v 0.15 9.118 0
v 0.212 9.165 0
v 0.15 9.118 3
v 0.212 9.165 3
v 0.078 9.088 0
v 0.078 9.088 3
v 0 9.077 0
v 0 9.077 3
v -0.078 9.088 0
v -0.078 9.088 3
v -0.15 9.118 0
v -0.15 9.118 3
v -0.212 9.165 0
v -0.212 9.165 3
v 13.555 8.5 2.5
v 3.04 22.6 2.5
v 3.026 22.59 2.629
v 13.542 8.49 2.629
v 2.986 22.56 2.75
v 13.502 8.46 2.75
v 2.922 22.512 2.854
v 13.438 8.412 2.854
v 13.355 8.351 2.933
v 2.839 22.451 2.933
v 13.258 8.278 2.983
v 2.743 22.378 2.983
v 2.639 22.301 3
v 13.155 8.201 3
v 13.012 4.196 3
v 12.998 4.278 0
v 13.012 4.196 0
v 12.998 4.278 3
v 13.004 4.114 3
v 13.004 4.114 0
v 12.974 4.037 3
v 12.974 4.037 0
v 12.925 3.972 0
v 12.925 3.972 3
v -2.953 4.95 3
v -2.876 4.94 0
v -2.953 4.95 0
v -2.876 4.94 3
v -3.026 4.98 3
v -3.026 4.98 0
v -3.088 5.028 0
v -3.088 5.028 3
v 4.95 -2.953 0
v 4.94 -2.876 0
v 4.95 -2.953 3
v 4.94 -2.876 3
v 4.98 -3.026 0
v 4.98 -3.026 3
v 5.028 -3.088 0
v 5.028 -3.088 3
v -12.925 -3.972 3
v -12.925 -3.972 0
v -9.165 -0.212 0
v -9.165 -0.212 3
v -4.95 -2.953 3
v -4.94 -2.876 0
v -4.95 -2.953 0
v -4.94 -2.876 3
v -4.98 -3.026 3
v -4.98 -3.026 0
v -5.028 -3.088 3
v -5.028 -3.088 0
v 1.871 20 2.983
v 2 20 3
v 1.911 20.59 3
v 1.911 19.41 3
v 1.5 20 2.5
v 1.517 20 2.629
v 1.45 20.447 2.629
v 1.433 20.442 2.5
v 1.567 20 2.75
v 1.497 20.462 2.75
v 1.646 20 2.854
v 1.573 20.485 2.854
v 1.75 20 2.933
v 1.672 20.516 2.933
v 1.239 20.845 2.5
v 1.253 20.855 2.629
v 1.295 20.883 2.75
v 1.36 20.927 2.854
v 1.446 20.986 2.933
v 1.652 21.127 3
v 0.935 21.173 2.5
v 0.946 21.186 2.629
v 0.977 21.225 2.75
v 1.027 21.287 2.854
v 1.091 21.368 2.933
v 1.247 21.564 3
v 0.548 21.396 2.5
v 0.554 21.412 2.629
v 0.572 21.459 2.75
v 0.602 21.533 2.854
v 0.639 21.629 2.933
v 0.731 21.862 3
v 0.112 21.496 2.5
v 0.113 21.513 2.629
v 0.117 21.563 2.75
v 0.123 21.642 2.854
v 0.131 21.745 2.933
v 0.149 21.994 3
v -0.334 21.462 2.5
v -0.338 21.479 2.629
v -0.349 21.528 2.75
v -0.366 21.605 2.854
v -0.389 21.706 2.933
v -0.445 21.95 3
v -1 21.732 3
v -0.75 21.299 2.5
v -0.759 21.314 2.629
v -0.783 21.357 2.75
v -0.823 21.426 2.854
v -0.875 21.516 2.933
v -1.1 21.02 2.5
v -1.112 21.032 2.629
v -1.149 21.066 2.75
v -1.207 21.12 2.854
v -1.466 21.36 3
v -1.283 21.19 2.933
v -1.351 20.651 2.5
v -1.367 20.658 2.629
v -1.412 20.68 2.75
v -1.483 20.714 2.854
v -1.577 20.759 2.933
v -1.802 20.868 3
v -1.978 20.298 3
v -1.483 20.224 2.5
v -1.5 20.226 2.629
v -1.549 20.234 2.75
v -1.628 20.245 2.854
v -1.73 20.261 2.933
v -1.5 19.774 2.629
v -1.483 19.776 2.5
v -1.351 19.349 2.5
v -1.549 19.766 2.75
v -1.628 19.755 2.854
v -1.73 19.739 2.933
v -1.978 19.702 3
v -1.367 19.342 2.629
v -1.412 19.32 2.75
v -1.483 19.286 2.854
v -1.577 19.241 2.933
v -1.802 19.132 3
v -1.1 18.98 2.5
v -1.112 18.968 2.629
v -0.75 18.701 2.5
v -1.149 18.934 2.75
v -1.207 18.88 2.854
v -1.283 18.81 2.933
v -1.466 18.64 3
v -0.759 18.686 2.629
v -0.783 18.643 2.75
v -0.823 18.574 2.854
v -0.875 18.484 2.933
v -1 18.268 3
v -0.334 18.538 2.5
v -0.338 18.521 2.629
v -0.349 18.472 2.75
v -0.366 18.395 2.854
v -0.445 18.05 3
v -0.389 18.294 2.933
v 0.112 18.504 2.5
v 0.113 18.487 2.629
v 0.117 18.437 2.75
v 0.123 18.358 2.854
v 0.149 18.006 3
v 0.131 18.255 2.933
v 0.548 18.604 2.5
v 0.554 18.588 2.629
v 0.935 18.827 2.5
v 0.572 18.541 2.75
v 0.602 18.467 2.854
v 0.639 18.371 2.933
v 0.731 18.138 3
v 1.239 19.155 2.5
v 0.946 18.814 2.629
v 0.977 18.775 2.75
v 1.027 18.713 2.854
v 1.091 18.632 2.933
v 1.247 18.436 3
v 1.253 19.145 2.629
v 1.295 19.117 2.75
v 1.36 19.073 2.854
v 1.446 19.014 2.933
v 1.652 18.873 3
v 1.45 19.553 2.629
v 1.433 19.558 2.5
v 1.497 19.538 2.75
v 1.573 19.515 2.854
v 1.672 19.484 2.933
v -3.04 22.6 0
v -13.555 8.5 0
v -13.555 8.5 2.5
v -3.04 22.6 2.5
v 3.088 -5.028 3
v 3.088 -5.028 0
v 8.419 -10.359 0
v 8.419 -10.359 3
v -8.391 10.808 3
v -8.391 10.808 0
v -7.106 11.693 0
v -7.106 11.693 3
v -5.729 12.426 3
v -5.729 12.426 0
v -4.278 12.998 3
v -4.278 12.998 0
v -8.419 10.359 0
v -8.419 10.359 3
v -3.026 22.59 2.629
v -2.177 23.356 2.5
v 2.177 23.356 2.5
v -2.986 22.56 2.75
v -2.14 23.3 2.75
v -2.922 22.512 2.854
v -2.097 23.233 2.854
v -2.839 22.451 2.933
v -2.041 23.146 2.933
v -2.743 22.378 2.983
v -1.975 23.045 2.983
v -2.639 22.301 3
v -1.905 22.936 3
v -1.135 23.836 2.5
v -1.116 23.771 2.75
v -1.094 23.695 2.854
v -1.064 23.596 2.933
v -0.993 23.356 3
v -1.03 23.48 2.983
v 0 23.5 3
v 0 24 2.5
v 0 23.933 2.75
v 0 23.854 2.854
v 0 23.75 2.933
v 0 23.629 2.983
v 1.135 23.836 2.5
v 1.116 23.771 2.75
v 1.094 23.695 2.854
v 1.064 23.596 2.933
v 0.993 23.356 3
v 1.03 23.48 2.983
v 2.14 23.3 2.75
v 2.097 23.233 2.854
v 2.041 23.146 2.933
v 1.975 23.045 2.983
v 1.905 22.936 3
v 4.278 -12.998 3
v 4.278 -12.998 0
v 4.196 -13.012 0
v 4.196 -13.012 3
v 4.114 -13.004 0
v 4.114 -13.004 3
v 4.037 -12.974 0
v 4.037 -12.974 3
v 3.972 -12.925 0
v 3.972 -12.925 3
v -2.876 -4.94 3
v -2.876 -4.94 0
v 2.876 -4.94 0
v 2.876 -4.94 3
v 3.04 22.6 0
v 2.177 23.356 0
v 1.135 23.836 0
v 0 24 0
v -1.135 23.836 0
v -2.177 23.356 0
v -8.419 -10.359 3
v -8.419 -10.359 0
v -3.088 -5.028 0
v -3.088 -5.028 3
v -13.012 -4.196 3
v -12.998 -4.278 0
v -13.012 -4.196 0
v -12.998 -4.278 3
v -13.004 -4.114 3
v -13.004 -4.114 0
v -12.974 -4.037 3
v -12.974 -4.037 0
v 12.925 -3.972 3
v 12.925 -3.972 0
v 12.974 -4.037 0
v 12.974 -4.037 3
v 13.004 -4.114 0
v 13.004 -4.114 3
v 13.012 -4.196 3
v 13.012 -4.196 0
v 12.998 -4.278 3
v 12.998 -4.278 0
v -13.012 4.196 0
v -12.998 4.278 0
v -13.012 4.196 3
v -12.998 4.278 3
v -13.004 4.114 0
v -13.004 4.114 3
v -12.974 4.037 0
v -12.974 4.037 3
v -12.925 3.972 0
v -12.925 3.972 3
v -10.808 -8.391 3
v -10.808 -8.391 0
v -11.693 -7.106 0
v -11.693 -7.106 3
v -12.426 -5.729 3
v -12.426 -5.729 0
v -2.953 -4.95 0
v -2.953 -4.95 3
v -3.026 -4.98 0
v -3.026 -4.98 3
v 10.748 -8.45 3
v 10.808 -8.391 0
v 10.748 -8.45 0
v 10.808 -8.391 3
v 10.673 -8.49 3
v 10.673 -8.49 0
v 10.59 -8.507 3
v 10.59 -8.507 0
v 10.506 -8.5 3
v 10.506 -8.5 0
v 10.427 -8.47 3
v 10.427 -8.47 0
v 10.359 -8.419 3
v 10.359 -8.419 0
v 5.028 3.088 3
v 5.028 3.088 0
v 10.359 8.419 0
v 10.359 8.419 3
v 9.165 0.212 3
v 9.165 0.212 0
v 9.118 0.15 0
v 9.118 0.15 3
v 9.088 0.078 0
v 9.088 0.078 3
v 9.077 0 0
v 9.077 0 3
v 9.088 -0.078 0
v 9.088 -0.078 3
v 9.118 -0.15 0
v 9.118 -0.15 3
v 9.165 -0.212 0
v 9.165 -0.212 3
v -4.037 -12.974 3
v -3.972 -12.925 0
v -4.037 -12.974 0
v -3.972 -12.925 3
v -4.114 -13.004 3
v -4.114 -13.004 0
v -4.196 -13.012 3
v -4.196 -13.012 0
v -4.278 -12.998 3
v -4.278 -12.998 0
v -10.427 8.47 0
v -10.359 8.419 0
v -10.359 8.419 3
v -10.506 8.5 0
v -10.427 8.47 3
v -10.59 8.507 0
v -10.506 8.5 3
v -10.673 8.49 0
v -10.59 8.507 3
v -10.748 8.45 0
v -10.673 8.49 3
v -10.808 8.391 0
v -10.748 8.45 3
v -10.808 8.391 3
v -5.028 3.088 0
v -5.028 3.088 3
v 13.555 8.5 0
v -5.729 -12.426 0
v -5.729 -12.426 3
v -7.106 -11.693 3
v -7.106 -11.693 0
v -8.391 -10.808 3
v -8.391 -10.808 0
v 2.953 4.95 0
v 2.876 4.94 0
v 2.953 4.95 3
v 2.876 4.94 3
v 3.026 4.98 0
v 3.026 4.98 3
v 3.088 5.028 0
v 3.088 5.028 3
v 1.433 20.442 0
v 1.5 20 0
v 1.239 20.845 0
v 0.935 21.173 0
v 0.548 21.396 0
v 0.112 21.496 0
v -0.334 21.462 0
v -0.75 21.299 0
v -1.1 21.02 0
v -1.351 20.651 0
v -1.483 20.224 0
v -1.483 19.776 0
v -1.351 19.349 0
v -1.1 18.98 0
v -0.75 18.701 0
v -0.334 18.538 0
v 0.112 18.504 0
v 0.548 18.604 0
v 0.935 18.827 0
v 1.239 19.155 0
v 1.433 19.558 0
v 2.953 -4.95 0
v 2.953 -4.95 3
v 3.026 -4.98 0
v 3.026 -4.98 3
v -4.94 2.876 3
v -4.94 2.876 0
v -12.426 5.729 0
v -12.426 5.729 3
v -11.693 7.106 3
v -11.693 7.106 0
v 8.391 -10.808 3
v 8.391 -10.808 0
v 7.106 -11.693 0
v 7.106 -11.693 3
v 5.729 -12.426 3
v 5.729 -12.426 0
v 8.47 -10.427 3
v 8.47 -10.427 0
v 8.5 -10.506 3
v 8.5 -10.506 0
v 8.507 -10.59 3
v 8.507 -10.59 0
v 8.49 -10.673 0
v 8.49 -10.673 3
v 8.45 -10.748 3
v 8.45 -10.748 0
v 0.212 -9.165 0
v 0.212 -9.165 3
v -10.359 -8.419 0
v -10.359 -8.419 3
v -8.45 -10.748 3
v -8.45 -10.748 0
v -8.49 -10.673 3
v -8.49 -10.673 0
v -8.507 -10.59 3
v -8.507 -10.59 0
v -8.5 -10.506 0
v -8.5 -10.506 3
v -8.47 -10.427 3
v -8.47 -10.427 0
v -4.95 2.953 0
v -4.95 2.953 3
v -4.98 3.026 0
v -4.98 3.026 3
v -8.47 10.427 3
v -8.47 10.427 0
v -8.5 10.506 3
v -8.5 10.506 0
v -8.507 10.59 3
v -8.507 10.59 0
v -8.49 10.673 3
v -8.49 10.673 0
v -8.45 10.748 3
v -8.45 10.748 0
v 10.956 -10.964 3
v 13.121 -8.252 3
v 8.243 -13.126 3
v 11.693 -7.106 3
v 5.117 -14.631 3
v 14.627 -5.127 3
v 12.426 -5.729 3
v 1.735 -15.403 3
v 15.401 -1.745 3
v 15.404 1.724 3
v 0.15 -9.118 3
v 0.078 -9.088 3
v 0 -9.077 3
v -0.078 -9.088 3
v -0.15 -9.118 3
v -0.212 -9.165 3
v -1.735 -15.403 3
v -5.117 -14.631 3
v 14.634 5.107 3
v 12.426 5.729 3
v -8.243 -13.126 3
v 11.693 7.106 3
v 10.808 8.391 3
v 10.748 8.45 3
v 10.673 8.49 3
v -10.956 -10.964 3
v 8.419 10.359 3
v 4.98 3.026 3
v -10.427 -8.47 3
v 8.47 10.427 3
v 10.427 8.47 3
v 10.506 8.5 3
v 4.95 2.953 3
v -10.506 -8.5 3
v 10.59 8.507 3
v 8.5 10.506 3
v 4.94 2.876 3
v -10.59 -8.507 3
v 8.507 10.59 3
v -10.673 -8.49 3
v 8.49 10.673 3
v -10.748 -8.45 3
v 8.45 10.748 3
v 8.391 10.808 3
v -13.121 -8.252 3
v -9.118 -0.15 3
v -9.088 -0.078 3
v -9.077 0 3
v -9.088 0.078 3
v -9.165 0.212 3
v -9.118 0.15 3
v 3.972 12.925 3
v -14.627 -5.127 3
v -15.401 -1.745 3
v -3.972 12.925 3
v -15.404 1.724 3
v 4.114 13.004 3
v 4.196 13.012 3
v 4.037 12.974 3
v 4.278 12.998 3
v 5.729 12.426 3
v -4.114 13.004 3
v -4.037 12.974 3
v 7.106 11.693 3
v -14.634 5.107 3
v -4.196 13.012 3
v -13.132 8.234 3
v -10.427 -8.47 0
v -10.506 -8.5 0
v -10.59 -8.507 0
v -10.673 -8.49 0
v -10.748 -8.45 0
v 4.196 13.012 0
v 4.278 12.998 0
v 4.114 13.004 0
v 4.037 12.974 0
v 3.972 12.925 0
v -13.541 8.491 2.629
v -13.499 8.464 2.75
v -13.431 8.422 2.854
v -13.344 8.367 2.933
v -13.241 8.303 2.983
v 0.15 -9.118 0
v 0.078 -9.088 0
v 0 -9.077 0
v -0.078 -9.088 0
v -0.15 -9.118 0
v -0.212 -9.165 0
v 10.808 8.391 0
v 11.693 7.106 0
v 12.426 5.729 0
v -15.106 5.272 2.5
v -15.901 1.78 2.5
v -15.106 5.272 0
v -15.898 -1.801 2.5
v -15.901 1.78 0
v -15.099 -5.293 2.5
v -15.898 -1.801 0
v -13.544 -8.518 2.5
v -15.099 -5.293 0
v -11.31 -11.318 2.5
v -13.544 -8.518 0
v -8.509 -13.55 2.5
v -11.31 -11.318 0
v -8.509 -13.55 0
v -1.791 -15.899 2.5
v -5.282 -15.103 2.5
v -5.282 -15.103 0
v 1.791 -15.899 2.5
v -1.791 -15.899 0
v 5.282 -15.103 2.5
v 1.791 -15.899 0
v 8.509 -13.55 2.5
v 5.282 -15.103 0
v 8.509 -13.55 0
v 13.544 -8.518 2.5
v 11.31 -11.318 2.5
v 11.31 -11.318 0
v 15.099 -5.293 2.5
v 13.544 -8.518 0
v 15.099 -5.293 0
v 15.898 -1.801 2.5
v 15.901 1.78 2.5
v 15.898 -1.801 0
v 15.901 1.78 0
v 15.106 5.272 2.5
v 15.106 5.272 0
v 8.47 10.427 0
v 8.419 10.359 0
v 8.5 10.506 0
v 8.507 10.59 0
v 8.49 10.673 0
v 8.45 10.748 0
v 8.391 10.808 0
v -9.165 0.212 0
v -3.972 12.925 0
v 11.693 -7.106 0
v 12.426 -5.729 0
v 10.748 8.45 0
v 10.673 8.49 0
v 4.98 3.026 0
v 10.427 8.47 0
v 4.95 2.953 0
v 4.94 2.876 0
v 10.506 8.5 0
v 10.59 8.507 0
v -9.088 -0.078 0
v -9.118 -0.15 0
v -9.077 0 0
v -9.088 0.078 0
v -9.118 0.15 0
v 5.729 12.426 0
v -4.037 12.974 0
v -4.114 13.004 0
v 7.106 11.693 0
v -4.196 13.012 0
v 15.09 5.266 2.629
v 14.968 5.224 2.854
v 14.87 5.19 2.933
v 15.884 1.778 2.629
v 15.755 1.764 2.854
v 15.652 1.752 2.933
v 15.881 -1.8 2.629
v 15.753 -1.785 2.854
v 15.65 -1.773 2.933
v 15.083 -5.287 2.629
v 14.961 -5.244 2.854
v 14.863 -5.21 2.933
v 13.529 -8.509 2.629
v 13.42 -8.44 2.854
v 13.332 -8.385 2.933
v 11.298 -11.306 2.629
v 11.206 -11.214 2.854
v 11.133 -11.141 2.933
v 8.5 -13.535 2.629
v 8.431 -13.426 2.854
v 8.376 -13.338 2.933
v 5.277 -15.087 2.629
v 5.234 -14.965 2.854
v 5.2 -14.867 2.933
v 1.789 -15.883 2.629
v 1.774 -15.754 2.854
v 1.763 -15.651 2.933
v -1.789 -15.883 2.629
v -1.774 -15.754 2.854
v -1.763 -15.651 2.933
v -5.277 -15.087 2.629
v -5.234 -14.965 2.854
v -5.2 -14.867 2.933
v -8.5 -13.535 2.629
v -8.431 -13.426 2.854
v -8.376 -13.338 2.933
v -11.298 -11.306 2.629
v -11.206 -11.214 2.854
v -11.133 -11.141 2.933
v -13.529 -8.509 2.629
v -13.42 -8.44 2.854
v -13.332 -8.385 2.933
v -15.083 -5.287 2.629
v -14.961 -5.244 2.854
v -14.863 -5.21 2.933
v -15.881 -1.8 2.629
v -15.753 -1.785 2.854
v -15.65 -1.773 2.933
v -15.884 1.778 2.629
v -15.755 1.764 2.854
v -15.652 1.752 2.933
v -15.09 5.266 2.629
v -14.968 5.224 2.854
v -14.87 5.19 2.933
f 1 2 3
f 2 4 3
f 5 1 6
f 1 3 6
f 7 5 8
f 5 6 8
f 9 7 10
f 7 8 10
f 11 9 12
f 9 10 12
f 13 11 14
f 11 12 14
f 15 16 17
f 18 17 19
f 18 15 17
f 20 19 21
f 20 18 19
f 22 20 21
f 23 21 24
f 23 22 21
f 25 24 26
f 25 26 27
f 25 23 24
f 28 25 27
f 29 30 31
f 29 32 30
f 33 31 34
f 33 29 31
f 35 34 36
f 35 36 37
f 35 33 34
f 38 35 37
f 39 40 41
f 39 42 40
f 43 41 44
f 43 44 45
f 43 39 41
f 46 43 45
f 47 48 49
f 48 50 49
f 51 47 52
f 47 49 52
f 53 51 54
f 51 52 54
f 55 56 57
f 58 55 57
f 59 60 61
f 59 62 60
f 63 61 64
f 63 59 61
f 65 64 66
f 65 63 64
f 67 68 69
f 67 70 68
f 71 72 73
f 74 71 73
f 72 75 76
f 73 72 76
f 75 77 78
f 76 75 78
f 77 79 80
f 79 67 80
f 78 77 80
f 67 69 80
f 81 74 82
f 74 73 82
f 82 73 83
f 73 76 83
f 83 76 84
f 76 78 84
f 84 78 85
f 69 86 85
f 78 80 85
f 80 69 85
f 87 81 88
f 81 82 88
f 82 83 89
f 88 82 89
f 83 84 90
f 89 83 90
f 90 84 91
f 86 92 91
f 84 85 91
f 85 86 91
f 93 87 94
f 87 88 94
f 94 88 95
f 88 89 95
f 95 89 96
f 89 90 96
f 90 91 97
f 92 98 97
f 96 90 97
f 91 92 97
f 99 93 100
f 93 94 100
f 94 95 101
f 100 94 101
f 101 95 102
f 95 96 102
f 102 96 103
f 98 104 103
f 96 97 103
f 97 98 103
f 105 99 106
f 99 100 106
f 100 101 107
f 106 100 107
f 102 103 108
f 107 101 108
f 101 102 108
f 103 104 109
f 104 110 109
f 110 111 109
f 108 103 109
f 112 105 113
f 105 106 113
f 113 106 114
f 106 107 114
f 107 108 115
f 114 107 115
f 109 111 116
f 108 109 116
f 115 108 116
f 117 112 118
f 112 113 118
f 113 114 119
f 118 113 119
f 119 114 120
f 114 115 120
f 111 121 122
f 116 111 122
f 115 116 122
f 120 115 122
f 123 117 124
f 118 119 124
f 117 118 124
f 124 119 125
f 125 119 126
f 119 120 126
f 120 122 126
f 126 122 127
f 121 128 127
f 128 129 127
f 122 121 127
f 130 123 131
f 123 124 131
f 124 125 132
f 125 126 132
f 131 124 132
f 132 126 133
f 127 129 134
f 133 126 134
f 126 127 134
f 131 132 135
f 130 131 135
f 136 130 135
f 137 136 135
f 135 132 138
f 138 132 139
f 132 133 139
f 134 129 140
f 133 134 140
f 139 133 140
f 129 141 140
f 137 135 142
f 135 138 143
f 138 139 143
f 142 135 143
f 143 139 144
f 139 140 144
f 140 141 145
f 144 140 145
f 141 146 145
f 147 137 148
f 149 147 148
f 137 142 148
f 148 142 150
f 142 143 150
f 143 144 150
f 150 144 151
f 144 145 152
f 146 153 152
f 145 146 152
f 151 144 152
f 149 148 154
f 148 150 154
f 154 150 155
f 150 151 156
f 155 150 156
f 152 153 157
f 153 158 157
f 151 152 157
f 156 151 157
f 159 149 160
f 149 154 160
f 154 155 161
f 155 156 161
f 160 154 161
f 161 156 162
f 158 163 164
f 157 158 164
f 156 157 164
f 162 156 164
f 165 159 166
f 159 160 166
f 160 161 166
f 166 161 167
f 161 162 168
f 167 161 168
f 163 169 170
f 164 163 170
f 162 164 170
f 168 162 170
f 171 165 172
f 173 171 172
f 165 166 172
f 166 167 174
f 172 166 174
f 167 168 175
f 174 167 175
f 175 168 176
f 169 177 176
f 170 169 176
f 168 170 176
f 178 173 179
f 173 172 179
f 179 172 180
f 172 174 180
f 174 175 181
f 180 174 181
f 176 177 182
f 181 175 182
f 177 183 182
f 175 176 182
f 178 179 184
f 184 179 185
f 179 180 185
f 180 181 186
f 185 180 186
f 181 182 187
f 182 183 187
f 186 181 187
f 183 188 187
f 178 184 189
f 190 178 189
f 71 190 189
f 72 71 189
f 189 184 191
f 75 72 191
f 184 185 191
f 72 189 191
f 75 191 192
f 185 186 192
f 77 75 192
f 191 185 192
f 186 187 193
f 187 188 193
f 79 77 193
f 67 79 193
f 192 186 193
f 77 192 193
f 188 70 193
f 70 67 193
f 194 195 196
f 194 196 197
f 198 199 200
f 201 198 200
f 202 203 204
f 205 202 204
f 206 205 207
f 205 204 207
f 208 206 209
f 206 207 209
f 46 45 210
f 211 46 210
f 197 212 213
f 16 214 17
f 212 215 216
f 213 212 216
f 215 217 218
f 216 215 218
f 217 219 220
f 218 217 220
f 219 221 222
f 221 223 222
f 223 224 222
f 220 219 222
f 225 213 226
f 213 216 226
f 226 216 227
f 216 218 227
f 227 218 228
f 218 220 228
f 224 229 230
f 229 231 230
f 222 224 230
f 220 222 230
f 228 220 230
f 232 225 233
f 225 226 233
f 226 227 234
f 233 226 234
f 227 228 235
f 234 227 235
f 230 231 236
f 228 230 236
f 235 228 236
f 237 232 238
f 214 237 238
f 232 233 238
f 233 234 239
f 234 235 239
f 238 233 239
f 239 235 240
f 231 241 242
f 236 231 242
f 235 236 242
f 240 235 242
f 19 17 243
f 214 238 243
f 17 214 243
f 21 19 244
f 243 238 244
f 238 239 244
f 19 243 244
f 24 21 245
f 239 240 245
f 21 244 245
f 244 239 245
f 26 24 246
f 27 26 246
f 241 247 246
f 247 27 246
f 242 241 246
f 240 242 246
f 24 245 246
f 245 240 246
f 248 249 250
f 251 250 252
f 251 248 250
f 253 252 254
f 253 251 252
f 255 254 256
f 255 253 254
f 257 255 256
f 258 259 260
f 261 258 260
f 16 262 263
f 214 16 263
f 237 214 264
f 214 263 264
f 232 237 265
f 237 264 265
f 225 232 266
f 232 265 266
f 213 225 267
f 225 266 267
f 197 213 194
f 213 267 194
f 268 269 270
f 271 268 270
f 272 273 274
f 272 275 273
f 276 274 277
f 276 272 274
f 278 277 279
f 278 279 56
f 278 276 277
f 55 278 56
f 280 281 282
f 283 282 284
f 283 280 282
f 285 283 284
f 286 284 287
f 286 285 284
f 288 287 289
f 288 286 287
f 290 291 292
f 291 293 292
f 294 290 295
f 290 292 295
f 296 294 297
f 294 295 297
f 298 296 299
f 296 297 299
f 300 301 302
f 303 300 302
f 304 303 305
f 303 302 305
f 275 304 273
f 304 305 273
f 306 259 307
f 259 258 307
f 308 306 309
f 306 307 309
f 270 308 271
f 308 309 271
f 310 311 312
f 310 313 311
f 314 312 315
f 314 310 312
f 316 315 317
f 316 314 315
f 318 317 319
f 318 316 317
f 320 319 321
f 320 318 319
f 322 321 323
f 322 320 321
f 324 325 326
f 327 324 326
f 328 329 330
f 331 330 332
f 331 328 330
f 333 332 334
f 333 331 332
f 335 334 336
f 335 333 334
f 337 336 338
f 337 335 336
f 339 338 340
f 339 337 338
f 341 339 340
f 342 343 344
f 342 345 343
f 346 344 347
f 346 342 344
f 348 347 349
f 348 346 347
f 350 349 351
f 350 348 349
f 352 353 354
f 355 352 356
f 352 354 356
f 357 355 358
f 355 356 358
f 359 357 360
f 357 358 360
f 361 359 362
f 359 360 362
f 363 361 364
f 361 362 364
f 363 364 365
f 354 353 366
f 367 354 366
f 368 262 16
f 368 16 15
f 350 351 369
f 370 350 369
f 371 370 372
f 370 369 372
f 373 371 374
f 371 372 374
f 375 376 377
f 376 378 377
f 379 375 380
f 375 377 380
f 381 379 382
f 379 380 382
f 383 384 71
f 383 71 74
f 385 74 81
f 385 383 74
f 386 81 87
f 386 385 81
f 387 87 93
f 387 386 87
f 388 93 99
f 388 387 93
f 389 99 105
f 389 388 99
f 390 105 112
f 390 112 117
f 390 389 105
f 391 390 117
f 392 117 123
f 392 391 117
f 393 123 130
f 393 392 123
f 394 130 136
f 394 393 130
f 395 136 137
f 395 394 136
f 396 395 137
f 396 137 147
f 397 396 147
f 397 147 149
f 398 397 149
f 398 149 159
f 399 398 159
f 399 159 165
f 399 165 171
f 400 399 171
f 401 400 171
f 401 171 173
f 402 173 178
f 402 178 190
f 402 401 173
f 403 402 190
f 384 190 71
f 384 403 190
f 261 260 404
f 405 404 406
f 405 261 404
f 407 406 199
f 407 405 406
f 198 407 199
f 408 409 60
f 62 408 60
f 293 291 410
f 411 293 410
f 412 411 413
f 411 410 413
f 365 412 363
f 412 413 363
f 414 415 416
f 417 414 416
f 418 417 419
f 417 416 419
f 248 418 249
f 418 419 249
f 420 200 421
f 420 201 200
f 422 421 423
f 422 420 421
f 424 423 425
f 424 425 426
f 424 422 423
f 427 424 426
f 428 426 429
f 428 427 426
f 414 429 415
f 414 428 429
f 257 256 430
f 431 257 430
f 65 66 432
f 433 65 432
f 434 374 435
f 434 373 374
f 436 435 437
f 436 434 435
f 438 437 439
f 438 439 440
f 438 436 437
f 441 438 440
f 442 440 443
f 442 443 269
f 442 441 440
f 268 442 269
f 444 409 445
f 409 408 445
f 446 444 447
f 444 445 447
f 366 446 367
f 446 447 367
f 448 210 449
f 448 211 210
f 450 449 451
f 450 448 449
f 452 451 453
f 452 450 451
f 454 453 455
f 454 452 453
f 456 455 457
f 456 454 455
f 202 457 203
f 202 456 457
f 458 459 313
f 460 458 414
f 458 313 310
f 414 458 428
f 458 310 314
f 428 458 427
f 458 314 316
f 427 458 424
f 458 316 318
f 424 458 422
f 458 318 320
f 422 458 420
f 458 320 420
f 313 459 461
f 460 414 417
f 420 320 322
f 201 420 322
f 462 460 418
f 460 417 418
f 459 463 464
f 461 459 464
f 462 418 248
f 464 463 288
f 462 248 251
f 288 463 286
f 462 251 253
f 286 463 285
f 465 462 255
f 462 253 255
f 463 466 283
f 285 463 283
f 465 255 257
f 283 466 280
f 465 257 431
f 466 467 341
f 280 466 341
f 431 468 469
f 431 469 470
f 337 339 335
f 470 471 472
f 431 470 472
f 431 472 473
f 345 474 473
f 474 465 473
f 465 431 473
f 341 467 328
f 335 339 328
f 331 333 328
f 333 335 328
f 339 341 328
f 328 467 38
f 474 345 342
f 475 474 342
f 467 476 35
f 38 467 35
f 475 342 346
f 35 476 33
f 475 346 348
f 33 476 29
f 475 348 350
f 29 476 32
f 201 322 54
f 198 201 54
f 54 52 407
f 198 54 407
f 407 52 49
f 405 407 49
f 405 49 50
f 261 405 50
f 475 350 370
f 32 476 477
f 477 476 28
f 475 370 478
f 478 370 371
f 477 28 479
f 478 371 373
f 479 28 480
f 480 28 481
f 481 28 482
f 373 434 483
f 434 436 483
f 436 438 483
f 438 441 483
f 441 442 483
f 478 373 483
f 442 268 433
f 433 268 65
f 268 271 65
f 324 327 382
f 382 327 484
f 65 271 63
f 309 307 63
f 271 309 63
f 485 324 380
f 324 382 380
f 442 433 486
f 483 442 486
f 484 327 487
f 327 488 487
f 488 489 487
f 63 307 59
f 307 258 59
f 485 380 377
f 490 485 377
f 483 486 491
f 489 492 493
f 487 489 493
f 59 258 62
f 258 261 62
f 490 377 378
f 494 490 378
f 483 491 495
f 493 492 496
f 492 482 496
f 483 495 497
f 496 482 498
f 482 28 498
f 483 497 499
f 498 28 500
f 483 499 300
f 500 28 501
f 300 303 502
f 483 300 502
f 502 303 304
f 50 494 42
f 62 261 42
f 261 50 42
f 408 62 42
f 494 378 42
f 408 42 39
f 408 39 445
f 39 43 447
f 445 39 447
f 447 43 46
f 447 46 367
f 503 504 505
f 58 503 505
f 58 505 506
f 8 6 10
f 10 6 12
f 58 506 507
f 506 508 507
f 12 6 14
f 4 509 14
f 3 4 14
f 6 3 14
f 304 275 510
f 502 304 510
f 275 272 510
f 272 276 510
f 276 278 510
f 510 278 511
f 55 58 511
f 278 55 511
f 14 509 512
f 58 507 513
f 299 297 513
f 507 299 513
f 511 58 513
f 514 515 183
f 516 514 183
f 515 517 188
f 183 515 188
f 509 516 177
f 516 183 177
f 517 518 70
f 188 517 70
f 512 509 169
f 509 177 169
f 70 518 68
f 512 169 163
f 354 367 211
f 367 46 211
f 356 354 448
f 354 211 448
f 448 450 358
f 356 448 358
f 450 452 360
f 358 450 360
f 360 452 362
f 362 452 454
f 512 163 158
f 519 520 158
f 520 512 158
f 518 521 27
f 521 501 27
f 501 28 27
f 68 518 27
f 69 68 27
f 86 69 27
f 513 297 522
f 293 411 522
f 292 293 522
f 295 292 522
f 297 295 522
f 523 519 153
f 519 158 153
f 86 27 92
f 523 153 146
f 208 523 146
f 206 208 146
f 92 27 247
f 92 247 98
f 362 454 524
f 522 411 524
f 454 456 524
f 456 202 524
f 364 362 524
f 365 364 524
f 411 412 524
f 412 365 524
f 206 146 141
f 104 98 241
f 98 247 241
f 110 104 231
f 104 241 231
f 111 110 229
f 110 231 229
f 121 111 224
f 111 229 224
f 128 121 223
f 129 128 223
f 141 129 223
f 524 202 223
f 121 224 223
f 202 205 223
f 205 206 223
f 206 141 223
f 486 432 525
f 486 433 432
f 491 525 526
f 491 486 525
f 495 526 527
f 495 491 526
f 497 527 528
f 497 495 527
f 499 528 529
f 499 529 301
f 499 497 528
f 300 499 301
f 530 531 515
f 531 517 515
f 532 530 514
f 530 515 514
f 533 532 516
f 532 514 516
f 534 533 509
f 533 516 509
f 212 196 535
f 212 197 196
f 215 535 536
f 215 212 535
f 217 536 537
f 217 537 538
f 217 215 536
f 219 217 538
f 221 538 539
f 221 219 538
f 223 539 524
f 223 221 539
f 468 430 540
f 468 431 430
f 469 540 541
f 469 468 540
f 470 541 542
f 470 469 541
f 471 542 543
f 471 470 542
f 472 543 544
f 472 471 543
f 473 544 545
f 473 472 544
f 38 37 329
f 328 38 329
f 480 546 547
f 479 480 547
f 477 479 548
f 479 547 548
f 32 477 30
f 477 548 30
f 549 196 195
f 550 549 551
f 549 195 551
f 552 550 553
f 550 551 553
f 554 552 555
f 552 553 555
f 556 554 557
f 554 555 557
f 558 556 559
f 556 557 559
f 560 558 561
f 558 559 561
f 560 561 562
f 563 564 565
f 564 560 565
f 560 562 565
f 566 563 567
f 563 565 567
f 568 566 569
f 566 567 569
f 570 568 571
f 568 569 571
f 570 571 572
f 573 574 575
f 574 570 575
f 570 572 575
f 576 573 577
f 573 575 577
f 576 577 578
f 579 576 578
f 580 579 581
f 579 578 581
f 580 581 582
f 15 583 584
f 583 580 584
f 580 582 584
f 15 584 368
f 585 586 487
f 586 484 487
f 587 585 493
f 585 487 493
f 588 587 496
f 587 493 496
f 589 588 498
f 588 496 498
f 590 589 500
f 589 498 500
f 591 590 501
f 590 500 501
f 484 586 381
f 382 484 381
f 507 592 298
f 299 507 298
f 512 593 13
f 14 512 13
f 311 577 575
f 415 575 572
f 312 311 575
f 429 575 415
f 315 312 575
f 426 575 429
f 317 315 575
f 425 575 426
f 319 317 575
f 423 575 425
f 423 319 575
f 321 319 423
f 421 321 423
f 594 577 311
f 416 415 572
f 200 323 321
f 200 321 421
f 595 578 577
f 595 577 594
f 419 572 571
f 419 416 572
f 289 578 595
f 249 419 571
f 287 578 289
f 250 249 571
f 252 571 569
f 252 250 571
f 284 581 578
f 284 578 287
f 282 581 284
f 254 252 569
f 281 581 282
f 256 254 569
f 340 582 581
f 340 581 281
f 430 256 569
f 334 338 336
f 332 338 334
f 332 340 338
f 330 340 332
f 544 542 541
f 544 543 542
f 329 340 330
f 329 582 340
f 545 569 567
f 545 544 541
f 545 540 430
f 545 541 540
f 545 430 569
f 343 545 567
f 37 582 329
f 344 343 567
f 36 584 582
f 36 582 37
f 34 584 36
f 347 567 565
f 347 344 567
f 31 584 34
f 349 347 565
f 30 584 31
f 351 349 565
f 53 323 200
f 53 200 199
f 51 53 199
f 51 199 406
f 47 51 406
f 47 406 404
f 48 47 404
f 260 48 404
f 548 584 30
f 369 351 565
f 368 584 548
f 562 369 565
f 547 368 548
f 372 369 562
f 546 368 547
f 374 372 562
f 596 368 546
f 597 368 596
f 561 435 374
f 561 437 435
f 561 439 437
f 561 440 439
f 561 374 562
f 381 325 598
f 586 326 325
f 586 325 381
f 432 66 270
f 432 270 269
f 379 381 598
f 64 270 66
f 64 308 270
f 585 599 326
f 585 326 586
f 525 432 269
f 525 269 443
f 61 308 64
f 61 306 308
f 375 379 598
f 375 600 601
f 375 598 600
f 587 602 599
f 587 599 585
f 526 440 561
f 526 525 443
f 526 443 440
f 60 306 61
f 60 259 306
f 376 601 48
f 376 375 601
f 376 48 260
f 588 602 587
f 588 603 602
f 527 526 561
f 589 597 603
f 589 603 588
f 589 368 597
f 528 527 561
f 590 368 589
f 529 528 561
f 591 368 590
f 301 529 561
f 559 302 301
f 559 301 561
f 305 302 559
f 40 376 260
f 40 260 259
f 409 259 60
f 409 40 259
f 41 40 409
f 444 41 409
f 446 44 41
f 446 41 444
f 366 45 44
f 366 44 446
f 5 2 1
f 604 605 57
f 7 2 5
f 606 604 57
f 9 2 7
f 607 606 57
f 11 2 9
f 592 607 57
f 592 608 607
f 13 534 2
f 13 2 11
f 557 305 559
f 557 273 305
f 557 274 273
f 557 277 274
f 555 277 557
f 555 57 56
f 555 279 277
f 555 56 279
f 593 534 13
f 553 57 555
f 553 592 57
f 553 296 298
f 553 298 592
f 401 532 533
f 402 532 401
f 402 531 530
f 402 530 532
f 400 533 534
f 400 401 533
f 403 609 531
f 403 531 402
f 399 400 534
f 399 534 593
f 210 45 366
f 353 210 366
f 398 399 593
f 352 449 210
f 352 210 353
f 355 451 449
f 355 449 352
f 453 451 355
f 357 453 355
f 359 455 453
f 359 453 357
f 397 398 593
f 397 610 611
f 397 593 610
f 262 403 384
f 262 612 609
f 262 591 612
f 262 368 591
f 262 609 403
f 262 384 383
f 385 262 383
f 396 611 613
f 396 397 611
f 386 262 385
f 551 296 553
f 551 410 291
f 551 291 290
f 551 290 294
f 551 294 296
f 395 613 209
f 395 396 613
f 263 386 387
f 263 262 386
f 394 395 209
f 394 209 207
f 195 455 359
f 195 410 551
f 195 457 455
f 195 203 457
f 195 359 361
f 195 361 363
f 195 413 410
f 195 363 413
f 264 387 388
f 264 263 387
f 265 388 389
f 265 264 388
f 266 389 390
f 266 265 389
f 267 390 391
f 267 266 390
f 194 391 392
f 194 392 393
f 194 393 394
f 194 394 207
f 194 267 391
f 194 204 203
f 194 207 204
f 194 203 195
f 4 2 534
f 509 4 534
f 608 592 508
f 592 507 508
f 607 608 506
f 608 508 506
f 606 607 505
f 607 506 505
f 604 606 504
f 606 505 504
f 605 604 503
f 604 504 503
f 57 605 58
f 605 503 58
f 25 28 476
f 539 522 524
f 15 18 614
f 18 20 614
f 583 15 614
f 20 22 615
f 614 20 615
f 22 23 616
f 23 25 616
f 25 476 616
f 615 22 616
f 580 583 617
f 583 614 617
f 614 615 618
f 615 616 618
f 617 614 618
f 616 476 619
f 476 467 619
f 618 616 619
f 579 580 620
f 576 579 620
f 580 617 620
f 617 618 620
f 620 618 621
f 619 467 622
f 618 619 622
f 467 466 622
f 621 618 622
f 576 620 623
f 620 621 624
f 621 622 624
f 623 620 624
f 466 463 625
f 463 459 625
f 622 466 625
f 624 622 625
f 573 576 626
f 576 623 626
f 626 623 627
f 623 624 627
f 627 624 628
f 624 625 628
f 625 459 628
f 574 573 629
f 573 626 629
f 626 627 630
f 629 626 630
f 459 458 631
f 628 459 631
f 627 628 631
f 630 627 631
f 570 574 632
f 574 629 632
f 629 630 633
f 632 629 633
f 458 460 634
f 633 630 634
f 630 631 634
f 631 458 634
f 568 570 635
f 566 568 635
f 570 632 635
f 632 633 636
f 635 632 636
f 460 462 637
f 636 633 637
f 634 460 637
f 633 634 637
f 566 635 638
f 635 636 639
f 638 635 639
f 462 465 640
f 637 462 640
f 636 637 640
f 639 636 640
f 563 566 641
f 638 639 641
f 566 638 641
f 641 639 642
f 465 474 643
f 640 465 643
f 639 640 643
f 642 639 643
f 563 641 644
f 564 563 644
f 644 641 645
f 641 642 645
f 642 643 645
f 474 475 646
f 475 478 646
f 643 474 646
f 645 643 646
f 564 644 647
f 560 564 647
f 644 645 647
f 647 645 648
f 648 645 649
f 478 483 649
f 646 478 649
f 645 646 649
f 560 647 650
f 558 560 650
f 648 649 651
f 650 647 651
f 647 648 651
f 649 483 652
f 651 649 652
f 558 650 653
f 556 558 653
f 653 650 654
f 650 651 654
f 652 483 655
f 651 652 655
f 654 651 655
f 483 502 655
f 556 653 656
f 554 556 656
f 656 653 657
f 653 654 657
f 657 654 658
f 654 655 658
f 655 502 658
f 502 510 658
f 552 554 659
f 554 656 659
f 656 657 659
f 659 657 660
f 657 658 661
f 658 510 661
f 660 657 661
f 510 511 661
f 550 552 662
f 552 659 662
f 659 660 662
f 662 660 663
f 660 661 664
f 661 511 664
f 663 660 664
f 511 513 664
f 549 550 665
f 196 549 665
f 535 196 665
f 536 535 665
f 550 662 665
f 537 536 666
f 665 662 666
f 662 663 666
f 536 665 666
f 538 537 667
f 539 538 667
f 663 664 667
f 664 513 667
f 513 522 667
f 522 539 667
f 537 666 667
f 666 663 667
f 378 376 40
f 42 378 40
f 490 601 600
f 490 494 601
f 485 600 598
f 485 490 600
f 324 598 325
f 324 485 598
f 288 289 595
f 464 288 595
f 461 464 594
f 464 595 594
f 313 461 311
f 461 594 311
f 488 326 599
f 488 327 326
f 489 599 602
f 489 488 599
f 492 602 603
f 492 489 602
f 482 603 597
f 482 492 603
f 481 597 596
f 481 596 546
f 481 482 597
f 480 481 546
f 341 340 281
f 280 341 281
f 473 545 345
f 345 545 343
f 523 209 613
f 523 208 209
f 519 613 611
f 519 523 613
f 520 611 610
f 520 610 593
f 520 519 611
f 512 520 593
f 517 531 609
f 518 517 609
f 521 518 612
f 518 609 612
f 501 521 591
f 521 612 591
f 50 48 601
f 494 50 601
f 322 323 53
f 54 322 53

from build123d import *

# Parameters (mm, degrees)
SKETCH_R           = 1.5
PAD_DEPTH          = 3
FILLET_R           = 0.5
POCKET_DEPTH       = 105.626533
FILLET001_R        = 0.3
POLARPATTERN_COUNT = 4
FILLET002_R        = 0.3
FILLET003_R        = 0.3
FILLET004_R        = 0.3


with BuildPart() as part:
    # Sketch → Pad (new body)
    with BuildSketch(Plane.XY):
        with BuildLine():
            Line((-13.555442, 8.5), (-3.039737, 22.6))
            ThreePointArc((3.039737, 22.6), (0, 24), (-3.039737, 22.6))
            Line((3.039737, 22.6), (13.555442, 8.5))
            ThreePointArc((-13.555442, 8.5), (0, -16), (13.555442, 8.5))
        make_face()
        with Locations((0, 20)):
            Circle(SKETCH_R, mode=Mode.SUBTRACT)
    extrude(amount=PAD_DEPTH)

    # Fillet
    fillet_edges = [part.edges().sort_by_distance(p)[0] for p in [
        (8.297589, 15.55, 3),
        (0, -16, 3),
        (-8.297589, 15.55, 3),
        (0, 24, 3),
        (-1.5, 20, 3),
    ]]
    fillet(fillet_edges, radius=FILLET_R)

    # Sketch001 (on Face6 of Pad) → Pocket (cut, through all)
    with BuildSketch(Plane(origin=(0, 0, 0), x_dir=(1, 0, 0), z_dir=(0, 0, -1))):
        with BuildLine():
            Line((-3, 4.94), (3, 4.94))
            Line((3, 4.94), (8.656854, 10.596854))
            ThreePointArc((8.656854, 10.596854), (6.496296, 12.042948), (4.101219, 13.054288))
            Line((4.101219, 13.054288), (0, 8.953069))
            Line((0, 8.953069), (-4.101219, 13.054288))
            ThreePointArc((-4.101219, 13.054288), (-6.496296, 12.042948), (-8.656854, 10.596854))
            Line((-8.656854, 10.596854), (-3, 4.94))
        make_face()
    pocket = extrude(amount=-POCKET_DEPTH, mode=Mode.SUBTRACT)

    # Fillet001
    fillet001_edges = [part.edges().sort_by_distance(p)[0] for p in [
        (-3, -4.94, 1.5),
        (3, -4.94, 1.5),
        (-8.656854, -10.596854, 1.5),
        (0, -8.953069, 1.5),
        (8.656854, -10.596854, 1.5),
        (4.101219, -13.054288, 1.5),
        (-4.101219, -13.054288, 1.5),
    ]]
    fillet(fillet001_edges, radius=FILLET001_R)

    # PolarPattern: Pocket ×4 about axis
    polarpattern_axis = Axis((0, 0, 0), (0, 0, -1))
    for i in range(1, POLARPATTERN_COUNT):
        add(pocket.rotate(polarpattern_axis, i * 360 / POLARPATTERN_COUNT), mode=Mode.SUBTRACT)

    # Fillet002
    fillet002_edges = [part.edges().sort_by_distance(p)[0] for p in [
        (10.596854, 8.656854, 1.5),
        (8.953069, 0, 1.5),
        (13.054288, 4.101219, 1.5),
        (13.054288, -4.101219, 1.5),
        (4.94, 3, 1.5),
        (4.94, -3, 1.5),
        (10.596854, -8.656854, 1.5),
    ]]
    fillet(fillet002_edges, radius=FILLET002_R)

    # Fillet003
    fillet003_edges = [part.edges().sort_by_distance(p)[0] for p in [
        (-10.596854, -8.656854, 1.5),
        (-8.953069, 0, 1.5),
        (-13.054288, 4.101219, 1.5),
        (-13.054288, -4.101219, 1.5),
        (-4.94, 3, 1.5),
        (-4.94, -3, 1.5),
        (-10.596854, 8.656854, 1.5),
    ]]
    fillet(fillet003_edges, radius=FILLET003_R)

    # Fillet004
    fillet004_edges = [part.edges().sort_by_distance(p)[0] for p in [
        (-8.656854, 10.596854, 1.5),
        (-3, 4.94, 1.5),
        (3, 4.94, 1.5),
        (8.656854, 10.596854, 1.5),
        (0, 8.953069, 1.5),
        (-4.101219, 13.054288, 1.5),
        (4.101219, 13.054288, 1.5),
    ]]
    fillet(fillet004_edges, radius=FILLET004_R)


solid = part.part
